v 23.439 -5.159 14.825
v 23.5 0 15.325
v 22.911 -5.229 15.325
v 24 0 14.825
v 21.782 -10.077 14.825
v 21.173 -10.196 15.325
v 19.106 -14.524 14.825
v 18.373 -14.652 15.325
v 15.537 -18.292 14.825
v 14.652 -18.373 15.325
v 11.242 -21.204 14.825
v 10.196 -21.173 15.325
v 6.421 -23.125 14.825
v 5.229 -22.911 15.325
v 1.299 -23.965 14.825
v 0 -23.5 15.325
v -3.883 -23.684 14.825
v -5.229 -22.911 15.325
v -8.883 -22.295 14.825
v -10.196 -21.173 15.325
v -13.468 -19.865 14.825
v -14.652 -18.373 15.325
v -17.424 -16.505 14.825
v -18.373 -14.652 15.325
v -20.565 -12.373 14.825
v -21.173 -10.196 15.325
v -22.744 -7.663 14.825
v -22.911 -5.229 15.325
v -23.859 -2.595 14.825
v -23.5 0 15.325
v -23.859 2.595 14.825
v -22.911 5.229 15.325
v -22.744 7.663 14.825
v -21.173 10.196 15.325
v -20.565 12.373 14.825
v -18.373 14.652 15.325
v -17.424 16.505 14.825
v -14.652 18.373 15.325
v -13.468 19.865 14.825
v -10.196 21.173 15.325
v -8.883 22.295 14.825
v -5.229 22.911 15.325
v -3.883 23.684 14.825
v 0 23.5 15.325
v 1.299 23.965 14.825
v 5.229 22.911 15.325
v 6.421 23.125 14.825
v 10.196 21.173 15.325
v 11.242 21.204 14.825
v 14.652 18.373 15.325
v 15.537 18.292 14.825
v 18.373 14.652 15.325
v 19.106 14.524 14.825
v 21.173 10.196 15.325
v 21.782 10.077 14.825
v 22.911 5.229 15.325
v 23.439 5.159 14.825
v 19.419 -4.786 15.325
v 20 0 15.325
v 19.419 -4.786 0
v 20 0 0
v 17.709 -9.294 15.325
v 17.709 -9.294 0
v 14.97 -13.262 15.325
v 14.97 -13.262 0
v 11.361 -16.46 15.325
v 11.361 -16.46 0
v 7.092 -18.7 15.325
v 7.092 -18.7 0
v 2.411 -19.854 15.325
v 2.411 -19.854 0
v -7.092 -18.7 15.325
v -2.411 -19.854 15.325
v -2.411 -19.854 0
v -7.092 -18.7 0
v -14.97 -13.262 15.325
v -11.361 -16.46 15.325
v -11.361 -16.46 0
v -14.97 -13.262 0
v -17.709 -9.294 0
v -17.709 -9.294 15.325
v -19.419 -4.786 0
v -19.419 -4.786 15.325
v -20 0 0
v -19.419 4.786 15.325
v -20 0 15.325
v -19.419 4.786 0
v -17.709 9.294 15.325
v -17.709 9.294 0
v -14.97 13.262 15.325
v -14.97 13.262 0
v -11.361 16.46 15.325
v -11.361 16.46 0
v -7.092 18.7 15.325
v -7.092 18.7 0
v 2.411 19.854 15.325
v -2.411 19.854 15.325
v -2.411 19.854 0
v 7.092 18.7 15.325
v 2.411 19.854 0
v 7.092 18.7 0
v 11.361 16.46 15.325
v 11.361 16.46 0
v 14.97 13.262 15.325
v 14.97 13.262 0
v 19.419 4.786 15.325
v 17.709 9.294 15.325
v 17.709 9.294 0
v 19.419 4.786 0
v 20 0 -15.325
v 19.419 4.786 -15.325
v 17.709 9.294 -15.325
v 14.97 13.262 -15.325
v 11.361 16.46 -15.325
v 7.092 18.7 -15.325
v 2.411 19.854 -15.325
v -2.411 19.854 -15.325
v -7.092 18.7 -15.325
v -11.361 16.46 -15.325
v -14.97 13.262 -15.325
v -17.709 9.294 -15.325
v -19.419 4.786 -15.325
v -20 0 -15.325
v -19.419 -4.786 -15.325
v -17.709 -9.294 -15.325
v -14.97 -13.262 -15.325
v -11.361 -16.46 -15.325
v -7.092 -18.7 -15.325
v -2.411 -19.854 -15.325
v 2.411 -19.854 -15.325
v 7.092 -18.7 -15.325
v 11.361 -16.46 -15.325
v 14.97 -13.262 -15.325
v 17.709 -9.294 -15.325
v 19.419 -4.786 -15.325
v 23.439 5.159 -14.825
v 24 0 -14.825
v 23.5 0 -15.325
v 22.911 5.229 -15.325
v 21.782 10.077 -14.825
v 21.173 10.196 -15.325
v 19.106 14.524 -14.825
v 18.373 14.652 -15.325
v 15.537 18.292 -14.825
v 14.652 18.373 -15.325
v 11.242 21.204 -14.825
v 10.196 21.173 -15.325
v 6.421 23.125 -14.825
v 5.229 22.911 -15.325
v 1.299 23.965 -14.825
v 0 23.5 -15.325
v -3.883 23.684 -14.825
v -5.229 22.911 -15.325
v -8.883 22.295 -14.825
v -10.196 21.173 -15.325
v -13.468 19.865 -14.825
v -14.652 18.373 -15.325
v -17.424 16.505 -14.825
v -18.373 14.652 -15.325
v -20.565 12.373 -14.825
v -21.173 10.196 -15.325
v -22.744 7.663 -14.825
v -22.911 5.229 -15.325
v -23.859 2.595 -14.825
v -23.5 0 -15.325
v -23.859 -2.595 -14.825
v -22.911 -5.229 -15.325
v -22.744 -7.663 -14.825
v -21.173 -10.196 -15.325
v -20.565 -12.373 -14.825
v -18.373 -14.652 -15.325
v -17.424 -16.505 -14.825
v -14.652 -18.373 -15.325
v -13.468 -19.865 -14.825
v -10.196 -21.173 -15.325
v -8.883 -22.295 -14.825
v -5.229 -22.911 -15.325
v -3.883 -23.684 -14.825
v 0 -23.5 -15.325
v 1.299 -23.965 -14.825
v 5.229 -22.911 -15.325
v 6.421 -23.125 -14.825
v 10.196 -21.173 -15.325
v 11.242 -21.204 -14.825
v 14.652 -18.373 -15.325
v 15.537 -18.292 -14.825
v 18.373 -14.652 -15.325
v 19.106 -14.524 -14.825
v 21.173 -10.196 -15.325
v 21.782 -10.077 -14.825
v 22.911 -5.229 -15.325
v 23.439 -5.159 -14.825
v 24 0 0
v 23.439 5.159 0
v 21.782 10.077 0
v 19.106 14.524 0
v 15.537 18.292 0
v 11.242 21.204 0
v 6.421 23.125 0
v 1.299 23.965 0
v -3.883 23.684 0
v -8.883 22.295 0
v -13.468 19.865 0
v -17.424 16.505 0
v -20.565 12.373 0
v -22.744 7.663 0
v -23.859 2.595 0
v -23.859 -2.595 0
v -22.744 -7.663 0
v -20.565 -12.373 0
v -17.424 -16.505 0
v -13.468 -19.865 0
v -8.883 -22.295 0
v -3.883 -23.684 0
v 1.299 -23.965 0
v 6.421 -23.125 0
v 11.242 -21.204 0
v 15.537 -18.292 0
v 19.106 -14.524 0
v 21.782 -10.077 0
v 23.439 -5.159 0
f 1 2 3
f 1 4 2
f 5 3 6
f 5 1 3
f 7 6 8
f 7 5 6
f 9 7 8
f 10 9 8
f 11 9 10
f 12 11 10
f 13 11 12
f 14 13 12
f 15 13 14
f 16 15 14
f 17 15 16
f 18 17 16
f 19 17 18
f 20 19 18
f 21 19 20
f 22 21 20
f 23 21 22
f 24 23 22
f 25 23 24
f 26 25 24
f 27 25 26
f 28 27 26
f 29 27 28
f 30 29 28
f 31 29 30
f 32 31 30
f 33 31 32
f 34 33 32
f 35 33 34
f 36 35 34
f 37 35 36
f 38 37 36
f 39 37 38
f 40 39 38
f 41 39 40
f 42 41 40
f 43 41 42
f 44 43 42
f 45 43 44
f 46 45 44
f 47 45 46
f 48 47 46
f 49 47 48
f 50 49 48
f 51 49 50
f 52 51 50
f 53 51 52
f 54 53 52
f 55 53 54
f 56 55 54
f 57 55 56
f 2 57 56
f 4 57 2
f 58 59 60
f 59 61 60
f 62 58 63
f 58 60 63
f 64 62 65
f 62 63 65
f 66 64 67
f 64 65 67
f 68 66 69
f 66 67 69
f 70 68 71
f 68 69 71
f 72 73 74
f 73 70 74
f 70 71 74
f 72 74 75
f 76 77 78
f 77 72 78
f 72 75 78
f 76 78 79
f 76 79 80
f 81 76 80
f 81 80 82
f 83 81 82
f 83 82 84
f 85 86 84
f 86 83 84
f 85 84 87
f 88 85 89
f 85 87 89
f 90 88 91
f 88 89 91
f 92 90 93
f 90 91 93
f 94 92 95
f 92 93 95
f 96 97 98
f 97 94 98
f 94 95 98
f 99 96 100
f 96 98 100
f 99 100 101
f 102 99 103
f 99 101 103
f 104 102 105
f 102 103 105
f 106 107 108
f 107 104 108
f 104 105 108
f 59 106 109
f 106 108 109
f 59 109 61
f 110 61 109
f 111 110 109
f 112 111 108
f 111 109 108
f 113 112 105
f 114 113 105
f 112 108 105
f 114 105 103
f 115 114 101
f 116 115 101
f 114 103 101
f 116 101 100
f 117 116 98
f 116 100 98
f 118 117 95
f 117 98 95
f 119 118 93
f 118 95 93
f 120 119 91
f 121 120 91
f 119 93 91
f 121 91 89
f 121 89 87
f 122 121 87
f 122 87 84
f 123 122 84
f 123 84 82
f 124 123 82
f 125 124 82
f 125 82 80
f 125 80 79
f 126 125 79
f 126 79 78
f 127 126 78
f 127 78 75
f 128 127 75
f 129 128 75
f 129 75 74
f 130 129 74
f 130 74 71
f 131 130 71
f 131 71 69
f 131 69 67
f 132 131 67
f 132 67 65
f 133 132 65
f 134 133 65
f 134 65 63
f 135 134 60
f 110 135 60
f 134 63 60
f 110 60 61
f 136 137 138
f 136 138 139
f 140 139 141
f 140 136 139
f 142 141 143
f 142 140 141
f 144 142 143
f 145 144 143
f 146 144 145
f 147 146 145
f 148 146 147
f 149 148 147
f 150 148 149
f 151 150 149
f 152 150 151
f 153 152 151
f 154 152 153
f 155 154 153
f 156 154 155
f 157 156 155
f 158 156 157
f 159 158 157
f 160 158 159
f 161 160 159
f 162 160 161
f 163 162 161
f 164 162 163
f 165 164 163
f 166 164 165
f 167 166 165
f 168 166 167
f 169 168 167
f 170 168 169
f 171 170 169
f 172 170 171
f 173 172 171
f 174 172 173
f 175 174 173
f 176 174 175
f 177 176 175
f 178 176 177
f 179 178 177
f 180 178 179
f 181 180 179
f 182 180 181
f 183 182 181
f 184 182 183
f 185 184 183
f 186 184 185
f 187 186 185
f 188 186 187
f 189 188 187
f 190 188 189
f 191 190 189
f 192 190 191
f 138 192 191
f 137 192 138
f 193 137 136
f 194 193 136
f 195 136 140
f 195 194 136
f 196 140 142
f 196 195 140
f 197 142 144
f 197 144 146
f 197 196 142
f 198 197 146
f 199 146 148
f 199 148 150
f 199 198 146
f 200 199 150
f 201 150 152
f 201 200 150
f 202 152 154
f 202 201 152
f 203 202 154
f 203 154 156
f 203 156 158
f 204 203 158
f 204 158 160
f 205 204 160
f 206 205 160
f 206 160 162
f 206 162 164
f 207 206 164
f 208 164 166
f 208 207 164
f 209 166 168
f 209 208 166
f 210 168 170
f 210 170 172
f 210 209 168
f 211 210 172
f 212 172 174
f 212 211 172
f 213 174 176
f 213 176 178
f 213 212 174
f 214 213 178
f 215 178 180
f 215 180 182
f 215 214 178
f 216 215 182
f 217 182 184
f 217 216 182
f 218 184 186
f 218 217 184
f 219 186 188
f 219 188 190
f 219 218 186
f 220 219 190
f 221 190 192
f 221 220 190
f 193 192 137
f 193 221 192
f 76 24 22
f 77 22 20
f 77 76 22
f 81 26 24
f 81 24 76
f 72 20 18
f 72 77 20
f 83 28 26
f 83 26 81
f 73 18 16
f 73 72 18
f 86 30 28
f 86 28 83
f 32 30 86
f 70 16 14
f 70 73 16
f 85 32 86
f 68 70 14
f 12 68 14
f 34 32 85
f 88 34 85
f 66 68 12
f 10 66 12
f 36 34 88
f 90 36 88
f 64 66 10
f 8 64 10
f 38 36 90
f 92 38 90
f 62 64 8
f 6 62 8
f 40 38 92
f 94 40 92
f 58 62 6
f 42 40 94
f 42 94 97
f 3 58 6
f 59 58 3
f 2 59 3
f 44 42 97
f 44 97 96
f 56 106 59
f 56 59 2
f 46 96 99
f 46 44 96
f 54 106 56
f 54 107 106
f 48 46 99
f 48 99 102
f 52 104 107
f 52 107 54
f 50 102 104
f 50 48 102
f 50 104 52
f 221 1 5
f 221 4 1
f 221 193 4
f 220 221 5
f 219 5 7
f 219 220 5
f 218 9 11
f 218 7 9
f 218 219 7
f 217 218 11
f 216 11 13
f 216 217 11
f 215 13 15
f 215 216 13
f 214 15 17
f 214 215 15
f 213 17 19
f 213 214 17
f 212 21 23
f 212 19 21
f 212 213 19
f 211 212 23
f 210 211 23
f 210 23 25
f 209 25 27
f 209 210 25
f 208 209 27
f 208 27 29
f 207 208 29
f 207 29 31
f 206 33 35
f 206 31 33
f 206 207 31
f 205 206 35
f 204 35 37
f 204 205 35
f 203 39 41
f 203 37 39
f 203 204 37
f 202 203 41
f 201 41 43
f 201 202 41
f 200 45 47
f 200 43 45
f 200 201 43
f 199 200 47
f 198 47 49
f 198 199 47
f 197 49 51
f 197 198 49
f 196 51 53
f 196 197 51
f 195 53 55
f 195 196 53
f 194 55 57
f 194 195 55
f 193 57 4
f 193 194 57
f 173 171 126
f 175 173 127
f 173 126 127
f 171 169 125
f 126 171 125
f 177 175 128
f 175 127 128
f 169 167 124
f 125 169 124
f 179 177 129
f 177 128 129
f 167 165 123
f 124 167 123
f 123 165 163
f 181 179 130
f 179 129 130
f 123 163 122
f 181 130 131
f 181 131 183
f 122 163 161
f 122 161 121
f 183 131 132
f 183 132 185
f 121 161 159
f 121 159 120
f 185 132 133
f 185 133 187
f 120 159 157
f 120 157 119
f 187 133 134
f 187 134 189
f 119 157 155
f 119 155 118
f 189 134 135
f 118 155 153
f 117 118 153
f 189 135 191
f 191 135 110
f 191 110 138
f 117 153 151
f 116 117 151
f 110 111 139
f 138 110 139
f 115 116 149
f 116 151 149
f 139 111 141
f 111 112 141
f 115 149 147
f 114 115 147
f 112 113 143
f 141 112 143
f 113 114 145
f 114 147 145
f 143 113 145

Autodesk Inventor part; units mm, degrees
ref_plane "YZ Plane" through (0, 0, 0) normal (1, 0, 0) x (0, 1, 0)
ref_plane "XZ Plane" through (0, 0, 0) normal (0, 1, 0) x (-1, 0, 0)
ref_plane "XY Plane" through (0, 0, 0) normal (0, 0, 1) x (1, 0, 0)
sketch "Esboço1" plane through (0, 0, 0) normal (0, 0, 1) x (1, 0, 0)
  circle A0 centre (0, 0) radius 20
  circle A1 centre (0, 0) radius 24
  dimension "d0" = 40
  dimension "d1" = 48
extrude "Extrusão1" add sketch "Esboço1" along normal mid plane 30.65
chamfer "Chanfro1" distance 0.5 angle 45 2 edges at (-24, 0, 15.325) (-24, 0, -15.325)
